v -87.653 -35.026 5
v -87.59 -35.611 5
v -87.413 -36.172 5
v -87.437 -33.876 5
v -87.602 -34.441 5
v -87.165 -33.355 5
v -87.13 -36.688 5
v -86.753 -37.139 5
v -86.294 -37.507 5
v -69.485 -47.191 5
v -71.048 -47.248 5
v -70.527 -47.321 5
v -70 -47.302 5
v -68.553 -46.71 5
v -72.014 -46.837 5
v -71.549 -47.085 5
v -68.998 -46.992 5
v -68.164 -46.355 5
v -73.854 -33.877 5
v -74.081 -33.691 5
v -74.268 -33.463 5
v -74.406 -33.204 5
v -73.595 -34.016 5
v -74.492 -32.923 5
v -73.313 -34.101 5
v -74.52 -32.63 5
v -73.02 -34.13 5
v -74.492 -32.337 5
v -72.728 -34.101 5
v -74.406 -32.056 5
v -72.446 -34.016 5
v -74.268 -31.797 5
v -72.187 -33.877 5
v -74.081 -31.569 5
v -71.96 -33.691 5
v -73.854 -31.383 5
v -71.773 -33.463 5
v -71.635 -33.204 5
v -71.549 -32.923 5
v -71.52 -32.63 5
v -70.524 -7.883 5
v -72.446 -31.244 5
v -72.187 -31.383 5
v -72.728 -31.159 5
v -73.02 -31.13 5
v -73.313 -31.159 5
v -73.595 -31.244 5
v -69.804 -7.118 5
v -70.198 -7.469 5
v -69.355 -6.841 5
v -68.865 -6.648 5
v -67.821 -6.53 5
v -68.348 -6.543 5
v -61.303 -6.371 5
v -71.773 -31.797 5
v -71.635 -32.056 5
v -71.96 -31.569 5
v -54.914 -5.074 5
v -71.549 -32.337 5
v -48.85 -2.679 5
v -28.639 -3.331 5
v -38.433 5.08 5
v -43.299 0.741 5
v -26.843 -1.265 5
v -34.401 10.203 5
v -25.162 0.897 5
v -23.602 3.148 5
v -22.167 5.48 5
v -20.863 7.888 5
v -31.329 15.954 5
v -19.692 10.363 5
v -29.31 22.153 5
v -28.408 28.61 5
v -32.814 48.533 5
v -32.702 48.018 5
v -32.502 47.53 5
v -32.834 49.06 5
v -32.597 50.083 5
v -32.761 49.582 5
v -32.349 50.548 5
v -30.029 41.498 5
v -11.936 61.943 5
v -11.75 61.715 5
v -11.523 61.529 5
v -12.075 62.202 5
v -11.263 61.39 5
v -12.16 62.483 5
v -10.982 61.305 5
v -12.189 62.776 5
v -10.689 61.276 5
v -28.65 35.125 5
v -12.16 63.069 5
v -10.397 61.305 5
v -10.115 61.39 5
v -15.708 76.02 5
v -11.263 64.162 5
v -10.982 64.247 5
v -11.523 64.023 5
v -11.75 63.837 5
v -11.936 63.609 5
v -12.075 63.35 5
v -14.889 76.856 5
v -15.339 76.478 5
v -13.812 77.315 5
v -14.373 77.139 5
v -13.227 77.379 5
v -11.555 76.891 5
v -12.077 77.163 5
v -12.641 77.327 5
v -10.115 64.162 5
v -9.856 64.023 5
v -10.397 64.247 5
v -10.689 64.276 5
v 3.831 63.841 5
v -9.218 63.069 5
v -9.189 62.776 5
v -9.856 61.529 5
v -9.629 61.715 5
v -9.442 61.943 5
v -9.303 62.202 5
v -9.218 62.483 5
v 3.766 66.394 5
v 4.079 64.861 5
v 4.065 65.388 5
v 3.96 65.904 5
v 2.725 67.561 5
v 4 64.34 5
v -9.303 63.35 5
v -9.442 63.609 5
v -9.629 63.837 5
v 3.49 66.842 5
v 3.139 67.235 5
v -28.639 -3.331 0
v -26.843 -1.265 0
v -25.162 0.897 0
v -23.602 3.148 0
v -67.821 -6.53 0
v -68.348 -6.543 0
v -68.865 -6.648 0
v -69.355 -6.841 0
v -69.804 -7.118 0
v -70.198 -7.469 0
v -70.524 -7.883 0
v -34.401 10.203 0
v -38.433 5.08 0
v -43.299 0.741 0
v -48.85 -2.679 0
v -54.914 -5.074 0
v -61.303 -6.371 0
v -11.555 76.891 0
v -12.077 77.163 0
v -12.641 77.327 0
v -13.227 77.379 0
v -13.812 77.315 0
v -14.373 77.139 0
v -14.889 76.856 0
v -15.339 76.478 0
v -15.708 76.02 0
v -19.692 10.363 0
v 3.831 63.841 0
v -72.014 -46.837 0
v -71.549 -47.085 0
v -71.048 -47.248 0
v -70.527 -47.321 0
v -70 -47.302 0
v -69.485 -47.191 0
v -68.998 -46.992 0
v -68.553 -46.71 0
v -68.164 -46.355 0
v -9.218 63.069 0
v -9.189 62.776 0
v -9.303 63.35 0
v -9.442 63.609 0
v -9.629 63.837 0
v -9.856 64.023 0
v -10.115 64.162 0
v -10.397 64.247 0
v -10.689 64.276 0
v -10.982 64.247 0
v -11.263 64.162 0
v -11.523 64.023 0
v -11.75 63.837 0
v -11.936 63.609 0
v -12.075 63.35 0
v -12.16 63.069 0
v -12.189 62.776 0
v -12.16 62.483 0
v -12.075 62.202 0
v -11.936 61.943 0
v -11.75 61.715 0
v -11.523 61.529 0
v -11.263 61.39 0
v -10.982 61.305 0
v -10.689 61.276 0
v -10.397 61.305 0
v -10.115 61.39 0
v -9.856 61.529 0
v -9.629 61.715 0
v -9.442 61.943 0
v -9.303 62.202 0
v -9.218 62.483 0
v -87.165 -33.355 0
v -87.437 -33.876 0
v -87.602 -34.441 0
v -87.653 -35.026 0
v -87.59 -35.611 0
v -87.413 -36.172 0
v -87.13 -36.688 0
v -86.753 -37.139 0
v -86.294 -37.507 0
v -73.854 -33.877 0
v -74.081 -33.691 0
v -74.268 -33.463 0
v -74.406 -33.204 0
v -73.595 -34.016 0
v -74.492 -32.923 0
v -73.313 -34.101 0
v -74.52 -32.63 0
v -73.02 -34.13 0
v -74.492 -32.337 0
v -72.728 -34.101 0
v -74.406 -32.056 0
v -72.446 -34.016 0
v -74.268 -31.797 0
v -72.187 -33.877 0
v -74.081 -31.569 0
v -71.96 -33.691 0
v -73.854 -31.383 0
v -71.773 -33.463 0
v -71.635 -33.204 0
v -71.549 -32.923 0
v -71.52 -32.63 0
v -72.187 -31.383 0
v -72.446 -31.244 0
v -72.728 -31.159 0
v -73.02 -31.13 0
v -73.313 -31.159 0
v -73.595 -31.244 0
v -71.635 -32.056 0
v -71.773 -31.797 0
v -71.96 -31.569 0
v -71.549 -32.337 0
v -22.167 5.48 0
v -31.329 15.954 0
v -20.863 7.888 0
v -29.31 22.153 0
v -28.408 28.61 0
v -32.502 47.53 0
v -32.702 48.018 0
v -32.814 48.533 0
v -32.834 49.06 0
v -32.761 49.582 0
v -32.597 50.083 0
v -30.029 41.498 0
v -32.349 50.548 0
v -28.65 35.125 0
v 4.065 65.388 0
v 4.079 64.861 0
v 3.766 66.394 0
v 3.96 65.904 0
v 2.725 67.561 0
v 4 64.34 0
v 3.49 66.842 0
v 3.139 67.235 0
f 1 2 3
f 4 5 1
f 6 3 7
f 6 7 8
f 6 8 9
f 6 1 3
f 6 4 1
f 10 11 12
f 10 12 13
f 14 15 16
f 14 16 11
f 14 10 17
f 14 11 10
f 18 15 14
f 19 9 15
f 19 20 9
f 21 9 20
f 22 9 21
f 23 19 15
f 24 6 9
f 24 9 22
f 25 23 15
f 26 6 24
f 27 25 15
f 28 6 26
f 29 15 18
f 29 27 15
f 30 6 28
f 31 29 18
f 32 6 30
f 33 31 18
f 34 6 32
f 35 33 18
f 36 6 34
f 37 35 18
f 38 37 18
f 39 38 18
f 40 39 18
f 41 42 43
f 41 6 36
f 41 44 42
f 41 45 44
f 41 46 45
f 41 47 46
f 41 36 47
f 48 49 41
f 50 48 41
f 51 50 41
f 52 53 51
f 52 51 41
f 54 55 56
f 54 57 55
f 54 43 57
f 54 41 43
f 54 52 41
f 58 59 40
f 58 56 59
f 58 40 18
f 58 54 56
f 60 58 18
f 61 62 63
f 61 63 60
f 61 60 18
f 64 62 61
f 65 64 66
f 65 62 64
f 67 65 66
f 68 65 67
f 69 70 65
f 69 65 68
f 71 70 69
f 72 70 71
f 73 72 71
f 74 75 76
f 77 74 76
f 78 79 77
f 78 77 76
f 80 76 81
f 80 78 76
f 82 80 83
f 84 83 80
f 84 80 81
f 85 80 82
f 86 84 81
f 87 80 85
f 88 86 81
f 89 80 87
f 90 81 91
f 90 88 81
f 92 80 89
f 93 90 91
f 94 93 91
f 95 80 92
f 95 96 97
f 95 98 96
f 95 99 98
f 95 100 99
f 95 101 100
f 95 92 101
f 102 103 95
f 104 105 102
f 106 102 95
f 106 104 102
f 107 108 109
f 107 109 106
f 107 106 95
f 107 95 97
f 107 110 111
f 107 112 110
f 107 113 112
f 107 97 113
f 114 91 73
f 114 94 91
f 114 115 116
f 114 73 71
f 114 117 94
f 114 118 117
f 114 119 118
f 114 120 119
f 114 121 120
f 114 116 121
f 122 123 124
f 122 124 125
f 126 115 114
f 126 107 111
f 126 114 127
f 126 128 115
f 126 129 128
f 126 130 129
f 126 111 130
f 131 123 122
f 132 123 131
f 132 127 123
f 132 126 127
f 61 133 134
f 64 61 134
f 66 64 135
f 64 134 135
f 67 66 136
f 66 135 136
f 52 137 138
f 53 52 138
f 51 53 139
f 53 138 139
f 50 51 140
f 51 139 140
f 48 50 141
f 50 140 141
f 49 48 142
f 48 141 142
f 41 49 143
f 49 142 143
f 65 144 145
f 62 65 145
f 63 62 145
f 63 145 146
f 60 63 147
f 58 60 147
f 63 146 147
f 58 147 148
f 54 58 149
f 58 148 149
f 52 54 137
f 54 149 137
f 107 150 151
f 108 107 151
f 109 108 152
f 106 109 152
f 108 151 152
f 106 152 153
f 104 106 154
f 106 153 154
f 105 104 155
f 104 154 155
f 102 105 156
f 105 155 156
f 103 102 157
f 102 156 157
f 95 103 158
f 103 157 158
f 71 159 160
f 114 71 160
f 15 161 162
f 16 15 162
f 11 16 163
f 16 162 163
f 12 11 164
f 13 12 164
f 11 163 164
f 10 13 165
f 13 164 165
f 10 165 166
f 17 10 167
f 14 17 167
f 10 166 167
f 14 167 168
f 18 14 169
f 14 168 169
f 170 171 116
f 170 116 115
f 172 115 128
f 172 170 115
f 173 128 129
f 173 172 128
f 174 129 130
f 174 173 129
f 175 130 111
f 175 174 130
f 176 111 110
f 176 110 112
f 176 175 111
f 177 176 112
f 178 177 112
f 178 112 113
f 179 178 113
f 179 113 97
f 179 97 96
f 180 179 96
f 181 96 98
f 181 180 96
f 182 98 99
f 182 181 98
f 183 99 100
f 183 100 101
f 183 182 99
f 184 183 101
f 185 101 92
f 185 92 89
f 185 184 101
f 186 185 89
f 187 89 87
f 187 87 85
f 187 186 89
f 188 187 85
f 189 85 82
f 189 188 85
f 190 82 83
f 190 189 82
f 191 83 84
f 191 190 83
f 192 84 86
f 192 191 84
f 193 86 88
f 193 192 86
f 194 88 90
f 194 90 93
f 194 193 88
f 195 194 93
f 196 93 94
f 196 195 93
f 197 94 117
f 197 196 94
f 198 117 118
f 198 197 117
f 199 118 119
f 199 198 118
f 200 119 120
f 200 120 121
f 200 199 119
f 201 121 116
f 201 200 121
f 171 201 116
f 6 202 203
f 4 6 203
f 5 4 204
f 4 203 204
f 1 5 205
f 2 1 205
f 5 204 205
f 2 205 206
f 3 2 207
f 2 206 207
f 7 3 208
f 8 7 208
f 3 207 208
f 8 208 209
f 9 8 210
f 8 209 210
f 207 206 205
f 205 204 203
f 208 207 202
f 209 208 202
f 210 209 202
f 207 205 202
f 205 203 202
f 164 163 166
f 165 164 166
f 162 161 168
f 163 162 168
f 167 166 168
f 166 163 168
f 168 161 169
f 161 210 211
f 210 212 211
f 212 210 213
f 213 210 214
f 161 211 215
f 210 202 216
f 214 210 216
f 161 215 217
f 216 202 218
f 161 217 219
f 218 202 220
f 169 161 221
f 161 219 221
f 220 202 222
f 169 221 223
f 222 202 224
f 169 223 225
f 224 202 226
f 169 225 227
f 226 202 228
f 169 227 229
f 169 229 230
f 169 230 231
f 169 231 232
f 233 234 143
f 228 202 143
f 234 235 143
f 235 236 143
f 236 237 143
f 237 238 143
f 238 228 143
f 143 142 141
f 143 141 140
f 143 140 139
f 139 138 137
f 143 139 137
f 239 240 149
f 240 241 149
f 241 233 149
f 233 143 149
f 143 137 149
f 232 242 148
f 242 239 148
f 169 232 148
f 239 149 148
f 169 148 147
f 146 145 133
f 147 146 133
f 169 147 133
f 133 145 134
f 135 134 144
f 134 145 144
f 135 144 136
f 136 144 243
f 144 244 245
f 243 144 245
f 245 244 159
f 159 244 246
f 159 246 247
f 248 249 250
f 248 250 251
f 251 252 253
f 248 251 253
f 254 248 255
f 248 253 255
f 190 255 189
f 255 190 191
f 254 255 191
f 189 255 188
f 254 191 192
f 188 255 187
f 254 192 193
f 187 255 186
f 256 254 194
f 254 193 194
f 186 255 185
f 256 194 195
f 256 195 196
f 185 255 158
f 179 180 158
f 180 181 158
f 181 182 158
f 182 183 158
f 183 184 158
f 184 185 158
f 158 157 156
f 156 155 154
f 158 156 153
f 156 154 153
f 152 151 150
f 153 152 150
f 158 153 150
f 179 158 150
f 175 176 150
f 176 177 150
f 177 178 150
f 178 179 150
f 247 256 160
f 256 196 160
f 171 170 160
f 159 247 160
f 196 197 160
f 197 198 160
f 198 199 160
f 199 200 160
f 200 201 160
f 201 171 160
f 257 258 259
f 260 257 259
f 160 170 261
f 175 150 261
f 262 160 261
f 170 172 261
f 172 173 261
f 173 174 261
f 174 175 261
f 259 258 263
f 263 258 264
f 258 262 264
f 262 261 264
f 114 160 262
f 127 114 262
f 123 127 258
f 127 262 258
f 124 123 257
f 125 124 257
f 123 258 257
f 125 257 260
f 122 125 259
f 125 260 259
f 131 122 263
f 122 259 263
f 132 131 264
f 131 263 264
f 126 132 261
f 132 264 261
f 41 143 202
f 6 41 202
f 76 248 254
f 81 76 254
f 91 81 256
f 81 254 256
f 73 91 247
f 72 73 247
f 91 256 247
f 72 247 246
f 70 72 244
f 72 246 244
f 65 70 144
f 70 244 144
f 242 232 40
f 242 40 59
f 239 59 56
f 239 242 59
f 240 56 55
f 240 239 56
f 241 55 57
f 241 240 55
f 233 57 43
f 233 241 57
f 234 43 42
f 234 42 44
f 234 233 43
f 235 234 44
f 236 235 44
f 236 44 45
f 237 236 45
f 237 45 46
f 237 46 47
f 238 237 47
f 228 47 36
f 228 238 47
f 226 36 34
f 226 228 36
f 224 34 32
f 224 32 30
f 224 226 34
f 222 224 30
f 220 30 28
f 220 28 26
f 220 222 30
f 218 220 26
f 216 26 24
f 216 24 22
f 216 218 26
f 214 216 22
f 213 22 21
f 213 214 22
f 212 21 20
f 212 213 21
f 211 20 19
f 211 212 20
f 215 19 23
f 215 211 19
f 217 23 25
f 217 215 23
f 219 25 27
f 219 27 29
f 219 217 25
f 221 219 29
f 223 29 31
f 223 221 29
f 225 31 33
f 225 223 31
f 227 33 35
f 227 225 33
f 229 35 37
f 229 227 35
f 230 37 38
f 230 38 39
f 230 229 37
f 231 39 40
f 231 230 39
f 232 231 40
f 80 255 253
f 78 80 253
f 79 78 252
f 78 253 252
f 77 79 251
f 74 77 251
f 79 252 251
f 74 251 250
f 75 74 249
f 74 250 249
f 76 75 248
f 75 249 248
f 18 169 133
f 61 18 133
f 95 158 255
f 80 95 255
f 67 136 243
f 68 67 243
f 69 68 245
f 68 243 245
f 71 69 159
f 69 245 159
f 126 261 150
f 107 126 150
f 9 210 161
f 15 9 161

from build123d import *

# Parameters (mm, degrees)
SKETCH1_R           = 1.5
BOSS_EXTRUDE1_DEPTH = 5


with BuildPart() as part:
    # Sketch1 → Boss-Extrude1 (new body)
    # profile 1 of 2: a face of its own
    with BuildSketch(Plane.XY):
        with BuildLine():
            ThreePointArc((-72.013621978, -46.836846361), (-70.000170189, -47.302108237), (-68.163524501, -46.354907448))
            Line((-68.163524501, -46.354907448), (-28.639229463, -3.331157144))
            ThreePointArc((-28.639229463, -3.331157144), (-25.987391066, -0.195217043), (-23.601858593, 3.14777593))
            Line((-23.601858593, 3.14777593), (-34.401340039, 10.203355318))
            ThreePointArc((-34.401340039, 10.203355318), (-48.850216004, -2.67902279), (-67.821167684, -6.529824621))
            ThreePointArc((-67.821167684, -6.529824621), (-69.355206904, -6.841210213), (-70.523579623, -7.882911947))
            Line((-70.523579623, -7.882911947), (-87.164902157, -33.35461938))
            ThreePointArc((-87.164902157, -33.35461938), (-87.589542424, -35.611111919), (-86.29422726, -37.506959108))
            Line((-86.29422726, -37.506959108), (-72.013621978, -46.836846361))
        make_face()
        with Locations((-73.020492871, -32.63009114)):
            Circle(SKETCH1_R, mode=Mode.SUBTRACT)
    # profile 2 of 2: a face of its own
    with BuildSketch(Plane.XY):
        with BuildLine():
            Line((-34.401340039, 10.203355318), (-23.601858593, 3.14777593))
            ThreePointArc((-23.601858593, 3.14777593), (-21.49872615, 6.675268117), (-19.692182619, 10.363461126))
            Line((-19.692182619, 10.363461126), (3.830578313, 63.841425809))
            ThreePointArc((3.830578313, 63.841425809), (3.960207556, 65.903864408), (2.725322858, 67.560824426))
            Line((2.725322858, 67.560824426), (-11.555282424, 76.890711678))
            ThreePointArc((-11.555282424, 76.890711678), (-13.811774964, 77.315351945), (-15.707622153, 76.020036781))
            Line((-15.707622153, 76.020036781), (-32.348944687, 50.548329348))
            ThreePointArc((-32.348944687, 50.548329348), (-32.833563081, 49.059913302), (-32.502490474, 47.530002114))
            ThreePointArc((-32.502490474, 47.530002114), (-28.408225903, 28.610100423), (-34.401340039, 10.203355318))
        make_face()
        with Locations((-10.689254116, 62.775972546)):
            Circle(SKETCH1_R, mode=Mode.SUBTRACT)
    extrude(amount=BOSS_EXTRUDE1_DEPTH)


solid = part.part
